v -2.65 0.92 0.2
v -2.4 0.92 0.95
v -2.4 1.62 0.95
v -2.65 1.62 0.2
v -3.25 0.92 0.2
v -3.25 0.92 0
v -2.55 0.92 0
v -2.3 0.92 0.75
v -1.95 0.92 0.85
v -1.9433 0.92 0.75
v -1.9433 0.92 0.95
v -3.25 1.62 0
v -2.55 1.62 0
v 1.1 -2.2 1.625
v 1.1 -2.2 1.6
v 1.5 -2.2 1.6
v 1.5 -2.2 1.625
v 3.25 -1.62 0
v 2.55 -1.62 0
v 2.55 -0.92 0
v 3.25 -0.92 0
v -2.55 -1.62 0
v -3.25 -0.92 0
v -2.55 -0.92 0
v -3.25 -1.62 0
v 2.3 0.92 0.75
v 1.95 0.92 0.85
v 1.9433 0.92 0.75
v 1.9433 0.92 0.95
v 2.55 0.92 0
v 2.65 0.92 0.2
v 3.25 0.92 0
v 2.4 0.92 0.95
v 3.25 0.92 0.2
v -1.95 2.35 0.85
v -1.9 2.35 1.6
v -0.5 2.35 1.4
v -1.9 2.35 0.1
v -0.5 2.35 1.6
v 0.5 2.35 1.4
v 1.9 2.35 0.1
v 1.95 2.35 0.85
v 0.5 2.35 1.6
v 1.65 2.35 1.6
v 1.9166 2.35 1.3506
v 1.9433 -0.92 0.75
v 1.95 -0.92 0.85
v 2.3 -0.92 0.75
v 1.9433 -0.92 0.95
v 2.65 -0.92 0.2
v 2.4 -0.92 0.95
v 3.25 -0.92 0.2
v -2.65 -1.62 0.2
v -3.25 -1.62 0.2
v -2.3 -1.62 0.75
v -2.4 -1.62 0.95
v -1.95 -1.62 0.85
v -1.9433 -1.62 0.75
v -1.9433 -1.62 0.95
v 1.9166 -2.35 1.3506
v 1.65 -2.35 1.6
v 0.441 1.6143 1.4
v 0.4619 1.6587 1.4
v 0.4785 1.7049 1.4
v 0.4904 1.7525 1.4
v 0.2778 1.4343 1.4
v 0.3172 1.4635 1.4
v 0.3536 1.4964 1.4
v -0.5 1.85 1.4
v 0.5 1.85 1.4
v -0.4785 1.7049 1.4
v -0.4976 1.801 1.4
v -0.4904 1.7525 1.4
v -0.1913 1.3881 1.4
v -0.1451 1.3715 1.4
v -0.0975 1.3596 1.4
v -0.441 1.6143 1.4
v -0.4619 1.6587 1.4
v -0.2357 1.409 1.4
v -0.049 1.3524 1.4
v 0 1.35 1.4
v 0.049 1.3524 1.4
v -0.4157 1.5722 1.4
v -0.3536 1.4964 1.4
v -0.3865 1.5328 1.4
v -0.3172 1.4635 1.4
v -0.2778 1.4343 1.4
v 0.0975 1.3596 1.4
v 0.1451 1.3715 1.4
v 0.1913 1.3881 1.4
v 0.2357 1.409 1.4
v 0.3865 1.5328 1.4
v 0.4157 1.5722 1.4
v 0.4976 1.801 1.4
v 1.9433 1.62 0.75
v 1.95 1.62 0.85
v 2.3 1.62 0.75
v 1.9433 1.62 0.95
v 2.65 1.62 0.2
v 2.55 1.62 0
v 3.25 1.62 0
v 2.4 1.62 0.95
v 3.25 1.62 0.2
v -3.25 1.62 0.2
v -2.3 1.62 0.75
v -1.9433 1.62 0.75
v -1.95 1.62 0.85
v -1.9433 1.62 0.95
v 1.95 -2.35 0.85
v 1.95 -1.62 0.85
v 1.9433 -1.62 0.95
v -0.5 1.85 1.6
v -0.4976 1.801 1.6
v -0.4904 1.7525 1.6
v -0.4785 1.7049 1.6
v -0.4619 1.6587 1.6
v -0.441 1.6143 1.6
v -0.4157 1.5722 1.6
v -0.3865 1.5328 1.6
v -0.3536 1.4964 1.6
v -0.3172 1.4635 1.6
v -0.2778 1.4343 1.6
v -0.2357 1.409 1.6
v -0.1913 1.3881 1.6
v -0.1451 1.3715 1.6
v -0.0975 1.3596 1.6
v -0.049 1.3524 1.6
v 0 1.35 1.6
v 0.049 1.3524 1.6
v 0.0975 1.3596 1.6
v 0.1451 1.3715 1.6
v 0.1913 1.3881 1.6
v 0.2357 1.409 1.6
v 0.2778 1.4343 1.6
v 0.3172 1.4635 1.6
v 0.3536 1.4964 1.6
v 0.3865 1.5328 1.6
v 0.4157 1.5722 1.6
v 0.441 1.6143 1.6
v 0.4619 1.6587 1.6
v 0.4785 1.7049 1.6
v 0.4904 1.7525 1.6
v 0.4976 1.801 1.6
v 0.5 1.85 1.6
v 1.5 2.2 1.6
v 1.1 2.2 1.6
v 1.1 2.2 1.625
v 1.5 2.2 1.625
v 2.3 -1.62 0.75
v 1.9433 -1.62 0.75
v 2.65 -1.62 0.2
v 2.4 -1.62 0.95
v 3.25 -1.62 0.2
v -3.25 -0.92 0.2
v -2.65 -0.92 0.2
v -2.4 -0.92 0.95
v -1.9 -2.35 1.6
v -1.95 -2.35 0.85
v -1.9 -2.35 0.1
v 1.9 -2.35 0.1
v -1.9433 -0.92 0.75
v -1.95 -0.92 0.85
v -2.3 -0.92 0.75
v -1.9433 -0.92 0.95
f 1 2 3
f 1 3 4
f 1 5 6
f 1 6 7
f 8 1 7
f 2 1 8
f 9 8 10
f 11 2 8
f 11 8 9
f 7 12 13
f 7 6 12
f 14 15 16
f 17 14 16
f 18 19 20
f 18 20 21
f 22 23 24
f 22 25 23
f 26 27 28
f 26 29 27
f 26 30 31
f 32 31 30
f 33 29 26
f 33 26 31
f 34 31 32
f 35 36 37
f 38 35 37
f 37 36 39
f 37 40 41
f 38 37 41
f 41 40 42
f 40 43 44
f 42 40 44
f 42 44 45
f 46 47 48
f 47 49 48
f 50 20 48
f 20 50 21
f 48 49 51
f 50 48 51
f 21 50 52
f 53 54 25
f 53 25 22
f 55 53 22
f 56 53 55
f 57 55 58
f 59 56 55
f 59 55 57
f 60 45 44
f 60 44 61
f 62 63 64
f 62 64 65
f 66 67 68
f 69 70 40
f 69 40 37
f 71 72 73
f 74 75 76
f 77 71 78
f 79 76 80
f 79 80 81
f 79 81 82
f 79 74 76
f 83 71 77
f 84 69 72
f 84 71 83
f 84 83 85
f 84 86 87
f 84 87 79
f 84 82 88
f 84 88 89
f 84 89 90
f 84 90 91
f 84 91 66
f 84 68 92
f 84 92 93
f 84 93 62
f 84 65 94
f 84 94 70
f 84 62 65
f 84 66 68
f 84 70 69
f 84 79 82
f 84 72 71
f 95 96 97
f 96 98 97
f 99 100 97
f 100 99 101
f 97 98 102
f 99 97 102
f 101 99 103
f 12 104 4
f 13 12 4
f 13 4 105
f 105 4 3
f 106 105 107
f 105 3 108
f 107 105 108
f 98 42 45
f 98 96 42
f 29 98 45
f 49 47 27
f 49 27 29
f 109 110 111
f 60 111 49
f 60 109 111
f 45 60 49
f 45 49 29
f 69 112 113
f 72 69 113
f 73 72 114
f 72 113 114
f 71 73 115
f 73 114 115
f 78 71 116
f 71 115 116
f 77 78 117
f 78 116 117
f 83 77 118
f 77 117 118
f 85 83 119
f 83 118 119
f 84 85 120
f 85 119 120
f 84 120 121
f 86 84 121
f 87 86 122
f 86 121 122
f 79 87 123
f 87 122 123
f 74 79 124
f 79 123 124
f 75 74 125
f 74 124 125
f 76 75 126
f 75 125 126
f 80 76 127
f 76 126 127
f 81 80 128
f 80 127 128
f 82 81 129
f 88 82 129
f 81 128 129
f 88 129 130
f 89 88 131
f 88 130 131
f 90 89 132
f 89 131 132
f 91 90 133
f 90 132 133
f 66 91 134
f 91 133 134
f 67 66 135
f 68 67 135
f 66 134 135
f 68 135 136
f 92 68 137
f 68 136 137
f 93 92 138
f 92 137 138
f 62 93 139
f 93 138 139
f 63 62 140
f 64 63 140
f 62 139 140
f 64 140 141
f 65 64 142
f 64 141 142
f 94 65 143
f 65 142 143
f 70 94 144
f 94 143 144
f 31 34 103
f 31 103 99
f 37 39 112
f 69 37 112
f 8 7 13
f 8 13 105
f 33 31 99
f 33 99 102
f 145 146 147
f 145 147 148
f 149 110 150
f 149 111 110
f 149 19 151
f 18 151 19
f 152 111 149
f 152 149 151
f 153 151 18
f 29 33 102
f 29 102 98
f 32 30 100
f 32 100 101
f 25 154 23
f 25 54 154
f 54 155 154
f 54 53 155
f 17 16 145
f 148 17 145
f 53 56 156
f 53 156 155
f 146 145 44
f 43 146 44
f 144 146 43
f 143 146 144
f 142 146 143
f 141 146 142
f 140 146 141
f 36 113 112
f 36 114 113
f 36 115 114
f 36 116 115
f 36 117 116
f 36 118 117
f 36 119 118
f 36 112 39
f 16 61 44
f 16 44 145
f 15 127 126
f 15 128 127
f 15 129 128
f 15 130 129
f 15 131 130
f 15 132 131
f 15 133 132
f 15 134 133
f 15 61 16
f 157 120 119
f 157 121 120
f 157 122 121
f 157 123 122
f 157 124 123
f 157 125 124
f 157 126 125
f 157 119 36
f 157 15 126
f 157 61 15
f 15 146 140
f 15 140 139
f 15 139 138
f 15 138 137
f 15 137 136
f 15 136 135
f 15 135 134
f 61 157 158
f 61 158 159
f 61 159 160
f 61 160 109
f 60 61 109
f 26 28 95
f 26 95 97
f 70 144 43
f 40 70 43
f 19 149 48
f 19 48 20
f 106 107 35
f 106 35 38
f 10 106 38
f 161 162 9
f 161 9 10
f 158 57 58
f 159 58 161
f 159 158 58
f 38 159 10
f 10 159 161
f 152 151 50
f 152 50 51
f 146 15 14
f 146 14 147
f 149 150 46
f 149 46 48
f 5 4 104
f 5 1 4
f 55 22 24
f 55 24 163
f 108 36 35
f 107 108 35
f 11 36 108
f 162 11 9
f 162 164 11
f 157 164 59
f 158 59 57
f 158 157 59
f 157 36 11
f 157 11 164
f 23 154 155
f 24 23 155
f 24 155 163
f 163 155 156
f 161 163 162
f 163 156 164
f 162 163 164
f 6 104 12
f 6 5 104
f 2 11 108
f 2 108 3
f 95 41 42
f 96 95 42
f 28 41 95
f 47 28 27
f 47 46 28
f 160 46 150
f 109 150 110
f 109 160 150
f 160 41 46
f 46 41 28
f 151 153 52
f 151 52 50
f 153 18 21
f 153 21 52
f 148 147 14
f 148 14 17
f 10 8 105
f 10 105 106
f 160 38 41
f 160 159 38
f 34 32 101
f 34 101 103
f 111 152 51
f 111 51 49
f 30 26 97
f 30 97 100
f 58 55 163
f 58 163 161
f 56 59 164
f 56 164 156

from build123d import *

# Parameters (mm, degrees)
PAD_DEPTH    = 2.35
CHAMFER_SIZE = 0.25
POCKET_DEPTH = 0.2
PAD003_DEPTH = 0.35
PAD002_DEPTH = 0.35
SKETCH005_W  = 0.4
SKETCH005_H  = 4.4
PAD004_DEPTH = 0.075


with BuildPart() as pocket:
    # Sketch → Pad (new body, symmetric)
    with BuildSketch(Plane.XZ):
        Polygon((-1.9, 0.1), (1.9, 0.1), (1.95, 0.85), (1.9, 1.6), (-1.9, 1.6), (-1.95, 0.85), align=None)
    extrude(amount=PAD_DEPTH, both=True)

    # Chamfer
    chamfer_edges = [pocket.edges().sort_by_distance(p)[0] for p in [
        (1.9, 0, 1.6),
    ]]
    chamfer(chamfer_edges, length=CHAMFER_SIZE)

    # Sketch004 → Pocket (cut)
    with BuildSketch(Plane(origin=(0, 0, 1.6), x_dir=(-1, 0, 0), z_dir=(0, 0, 1))):
        with BuildLine():
            ThreePointArc((0.5, -1.85), (0, -1.35), (-0.5, -1.85))
            Line((-0.5, -1.85), (-0.5, -2.35))
            Line((-0.5, -2.35), (0.5, -2.35))
            Line((0.5, -2.35), (0.5, -1.85))
        make_face()
    extrude(amount=-POCKET_DEPTH, mode=Mode.SUBTRACT)


with BuildPart() as pad003:
    # Sketch003 → Pad003 (new body, symmetric)
    with BuildSketch(Plane.XZ.offset(-1.27)):
        Polygon((-3.25, 0), (-2.55, 0), (-2.3, 0.75), (2.3, 0.75), (2.55, 0), (3.25, 0), (3.25, 0.2), (2.65, 0.2), (2.4, 0.95), (-2.4, 0.95), (-2.65, 0.2), (-3.25, 0.2), align=None)
    extrude(amount=PAD003_DEPTH, both=True)


with BuildPart() as pad002:
    # Sketch002 → Pad002 (new body, symmetric)
    with BuildSketch(Plane.XZ.offset(1.27)):
        Polygon((-3.25, 0), (-2.55, 0), (-2.3, 0.75), (2.3, 0.75), (2.55, 0), (3.25, 0), (3.25, 0.2), (2.65, 0.2), (2.4, 0.95), (-2.4, 0.95), (-2.65, 0.2), (-3.25, 0.2), align=None)
    extrude(amount=PAD002_DEPTH, both=True)


with BuildPart() as to_269aa:
    # Sketch005 → Pad004 (new body)
    with BuildSketch(Plane.XY.offset(1.55)):
        with Locations((1.3, 0)):
            Rectangle(SKETCH005_W, SKETCH005_H)
    extrude(amount=PAD004_DEPTH)

    # Pad004_mp_cp: union Pocket, Pad003, Pad002
    add(pocket.part)
    add(pad003.part)
    add(pad002.part)


solid = to_269aa.part
